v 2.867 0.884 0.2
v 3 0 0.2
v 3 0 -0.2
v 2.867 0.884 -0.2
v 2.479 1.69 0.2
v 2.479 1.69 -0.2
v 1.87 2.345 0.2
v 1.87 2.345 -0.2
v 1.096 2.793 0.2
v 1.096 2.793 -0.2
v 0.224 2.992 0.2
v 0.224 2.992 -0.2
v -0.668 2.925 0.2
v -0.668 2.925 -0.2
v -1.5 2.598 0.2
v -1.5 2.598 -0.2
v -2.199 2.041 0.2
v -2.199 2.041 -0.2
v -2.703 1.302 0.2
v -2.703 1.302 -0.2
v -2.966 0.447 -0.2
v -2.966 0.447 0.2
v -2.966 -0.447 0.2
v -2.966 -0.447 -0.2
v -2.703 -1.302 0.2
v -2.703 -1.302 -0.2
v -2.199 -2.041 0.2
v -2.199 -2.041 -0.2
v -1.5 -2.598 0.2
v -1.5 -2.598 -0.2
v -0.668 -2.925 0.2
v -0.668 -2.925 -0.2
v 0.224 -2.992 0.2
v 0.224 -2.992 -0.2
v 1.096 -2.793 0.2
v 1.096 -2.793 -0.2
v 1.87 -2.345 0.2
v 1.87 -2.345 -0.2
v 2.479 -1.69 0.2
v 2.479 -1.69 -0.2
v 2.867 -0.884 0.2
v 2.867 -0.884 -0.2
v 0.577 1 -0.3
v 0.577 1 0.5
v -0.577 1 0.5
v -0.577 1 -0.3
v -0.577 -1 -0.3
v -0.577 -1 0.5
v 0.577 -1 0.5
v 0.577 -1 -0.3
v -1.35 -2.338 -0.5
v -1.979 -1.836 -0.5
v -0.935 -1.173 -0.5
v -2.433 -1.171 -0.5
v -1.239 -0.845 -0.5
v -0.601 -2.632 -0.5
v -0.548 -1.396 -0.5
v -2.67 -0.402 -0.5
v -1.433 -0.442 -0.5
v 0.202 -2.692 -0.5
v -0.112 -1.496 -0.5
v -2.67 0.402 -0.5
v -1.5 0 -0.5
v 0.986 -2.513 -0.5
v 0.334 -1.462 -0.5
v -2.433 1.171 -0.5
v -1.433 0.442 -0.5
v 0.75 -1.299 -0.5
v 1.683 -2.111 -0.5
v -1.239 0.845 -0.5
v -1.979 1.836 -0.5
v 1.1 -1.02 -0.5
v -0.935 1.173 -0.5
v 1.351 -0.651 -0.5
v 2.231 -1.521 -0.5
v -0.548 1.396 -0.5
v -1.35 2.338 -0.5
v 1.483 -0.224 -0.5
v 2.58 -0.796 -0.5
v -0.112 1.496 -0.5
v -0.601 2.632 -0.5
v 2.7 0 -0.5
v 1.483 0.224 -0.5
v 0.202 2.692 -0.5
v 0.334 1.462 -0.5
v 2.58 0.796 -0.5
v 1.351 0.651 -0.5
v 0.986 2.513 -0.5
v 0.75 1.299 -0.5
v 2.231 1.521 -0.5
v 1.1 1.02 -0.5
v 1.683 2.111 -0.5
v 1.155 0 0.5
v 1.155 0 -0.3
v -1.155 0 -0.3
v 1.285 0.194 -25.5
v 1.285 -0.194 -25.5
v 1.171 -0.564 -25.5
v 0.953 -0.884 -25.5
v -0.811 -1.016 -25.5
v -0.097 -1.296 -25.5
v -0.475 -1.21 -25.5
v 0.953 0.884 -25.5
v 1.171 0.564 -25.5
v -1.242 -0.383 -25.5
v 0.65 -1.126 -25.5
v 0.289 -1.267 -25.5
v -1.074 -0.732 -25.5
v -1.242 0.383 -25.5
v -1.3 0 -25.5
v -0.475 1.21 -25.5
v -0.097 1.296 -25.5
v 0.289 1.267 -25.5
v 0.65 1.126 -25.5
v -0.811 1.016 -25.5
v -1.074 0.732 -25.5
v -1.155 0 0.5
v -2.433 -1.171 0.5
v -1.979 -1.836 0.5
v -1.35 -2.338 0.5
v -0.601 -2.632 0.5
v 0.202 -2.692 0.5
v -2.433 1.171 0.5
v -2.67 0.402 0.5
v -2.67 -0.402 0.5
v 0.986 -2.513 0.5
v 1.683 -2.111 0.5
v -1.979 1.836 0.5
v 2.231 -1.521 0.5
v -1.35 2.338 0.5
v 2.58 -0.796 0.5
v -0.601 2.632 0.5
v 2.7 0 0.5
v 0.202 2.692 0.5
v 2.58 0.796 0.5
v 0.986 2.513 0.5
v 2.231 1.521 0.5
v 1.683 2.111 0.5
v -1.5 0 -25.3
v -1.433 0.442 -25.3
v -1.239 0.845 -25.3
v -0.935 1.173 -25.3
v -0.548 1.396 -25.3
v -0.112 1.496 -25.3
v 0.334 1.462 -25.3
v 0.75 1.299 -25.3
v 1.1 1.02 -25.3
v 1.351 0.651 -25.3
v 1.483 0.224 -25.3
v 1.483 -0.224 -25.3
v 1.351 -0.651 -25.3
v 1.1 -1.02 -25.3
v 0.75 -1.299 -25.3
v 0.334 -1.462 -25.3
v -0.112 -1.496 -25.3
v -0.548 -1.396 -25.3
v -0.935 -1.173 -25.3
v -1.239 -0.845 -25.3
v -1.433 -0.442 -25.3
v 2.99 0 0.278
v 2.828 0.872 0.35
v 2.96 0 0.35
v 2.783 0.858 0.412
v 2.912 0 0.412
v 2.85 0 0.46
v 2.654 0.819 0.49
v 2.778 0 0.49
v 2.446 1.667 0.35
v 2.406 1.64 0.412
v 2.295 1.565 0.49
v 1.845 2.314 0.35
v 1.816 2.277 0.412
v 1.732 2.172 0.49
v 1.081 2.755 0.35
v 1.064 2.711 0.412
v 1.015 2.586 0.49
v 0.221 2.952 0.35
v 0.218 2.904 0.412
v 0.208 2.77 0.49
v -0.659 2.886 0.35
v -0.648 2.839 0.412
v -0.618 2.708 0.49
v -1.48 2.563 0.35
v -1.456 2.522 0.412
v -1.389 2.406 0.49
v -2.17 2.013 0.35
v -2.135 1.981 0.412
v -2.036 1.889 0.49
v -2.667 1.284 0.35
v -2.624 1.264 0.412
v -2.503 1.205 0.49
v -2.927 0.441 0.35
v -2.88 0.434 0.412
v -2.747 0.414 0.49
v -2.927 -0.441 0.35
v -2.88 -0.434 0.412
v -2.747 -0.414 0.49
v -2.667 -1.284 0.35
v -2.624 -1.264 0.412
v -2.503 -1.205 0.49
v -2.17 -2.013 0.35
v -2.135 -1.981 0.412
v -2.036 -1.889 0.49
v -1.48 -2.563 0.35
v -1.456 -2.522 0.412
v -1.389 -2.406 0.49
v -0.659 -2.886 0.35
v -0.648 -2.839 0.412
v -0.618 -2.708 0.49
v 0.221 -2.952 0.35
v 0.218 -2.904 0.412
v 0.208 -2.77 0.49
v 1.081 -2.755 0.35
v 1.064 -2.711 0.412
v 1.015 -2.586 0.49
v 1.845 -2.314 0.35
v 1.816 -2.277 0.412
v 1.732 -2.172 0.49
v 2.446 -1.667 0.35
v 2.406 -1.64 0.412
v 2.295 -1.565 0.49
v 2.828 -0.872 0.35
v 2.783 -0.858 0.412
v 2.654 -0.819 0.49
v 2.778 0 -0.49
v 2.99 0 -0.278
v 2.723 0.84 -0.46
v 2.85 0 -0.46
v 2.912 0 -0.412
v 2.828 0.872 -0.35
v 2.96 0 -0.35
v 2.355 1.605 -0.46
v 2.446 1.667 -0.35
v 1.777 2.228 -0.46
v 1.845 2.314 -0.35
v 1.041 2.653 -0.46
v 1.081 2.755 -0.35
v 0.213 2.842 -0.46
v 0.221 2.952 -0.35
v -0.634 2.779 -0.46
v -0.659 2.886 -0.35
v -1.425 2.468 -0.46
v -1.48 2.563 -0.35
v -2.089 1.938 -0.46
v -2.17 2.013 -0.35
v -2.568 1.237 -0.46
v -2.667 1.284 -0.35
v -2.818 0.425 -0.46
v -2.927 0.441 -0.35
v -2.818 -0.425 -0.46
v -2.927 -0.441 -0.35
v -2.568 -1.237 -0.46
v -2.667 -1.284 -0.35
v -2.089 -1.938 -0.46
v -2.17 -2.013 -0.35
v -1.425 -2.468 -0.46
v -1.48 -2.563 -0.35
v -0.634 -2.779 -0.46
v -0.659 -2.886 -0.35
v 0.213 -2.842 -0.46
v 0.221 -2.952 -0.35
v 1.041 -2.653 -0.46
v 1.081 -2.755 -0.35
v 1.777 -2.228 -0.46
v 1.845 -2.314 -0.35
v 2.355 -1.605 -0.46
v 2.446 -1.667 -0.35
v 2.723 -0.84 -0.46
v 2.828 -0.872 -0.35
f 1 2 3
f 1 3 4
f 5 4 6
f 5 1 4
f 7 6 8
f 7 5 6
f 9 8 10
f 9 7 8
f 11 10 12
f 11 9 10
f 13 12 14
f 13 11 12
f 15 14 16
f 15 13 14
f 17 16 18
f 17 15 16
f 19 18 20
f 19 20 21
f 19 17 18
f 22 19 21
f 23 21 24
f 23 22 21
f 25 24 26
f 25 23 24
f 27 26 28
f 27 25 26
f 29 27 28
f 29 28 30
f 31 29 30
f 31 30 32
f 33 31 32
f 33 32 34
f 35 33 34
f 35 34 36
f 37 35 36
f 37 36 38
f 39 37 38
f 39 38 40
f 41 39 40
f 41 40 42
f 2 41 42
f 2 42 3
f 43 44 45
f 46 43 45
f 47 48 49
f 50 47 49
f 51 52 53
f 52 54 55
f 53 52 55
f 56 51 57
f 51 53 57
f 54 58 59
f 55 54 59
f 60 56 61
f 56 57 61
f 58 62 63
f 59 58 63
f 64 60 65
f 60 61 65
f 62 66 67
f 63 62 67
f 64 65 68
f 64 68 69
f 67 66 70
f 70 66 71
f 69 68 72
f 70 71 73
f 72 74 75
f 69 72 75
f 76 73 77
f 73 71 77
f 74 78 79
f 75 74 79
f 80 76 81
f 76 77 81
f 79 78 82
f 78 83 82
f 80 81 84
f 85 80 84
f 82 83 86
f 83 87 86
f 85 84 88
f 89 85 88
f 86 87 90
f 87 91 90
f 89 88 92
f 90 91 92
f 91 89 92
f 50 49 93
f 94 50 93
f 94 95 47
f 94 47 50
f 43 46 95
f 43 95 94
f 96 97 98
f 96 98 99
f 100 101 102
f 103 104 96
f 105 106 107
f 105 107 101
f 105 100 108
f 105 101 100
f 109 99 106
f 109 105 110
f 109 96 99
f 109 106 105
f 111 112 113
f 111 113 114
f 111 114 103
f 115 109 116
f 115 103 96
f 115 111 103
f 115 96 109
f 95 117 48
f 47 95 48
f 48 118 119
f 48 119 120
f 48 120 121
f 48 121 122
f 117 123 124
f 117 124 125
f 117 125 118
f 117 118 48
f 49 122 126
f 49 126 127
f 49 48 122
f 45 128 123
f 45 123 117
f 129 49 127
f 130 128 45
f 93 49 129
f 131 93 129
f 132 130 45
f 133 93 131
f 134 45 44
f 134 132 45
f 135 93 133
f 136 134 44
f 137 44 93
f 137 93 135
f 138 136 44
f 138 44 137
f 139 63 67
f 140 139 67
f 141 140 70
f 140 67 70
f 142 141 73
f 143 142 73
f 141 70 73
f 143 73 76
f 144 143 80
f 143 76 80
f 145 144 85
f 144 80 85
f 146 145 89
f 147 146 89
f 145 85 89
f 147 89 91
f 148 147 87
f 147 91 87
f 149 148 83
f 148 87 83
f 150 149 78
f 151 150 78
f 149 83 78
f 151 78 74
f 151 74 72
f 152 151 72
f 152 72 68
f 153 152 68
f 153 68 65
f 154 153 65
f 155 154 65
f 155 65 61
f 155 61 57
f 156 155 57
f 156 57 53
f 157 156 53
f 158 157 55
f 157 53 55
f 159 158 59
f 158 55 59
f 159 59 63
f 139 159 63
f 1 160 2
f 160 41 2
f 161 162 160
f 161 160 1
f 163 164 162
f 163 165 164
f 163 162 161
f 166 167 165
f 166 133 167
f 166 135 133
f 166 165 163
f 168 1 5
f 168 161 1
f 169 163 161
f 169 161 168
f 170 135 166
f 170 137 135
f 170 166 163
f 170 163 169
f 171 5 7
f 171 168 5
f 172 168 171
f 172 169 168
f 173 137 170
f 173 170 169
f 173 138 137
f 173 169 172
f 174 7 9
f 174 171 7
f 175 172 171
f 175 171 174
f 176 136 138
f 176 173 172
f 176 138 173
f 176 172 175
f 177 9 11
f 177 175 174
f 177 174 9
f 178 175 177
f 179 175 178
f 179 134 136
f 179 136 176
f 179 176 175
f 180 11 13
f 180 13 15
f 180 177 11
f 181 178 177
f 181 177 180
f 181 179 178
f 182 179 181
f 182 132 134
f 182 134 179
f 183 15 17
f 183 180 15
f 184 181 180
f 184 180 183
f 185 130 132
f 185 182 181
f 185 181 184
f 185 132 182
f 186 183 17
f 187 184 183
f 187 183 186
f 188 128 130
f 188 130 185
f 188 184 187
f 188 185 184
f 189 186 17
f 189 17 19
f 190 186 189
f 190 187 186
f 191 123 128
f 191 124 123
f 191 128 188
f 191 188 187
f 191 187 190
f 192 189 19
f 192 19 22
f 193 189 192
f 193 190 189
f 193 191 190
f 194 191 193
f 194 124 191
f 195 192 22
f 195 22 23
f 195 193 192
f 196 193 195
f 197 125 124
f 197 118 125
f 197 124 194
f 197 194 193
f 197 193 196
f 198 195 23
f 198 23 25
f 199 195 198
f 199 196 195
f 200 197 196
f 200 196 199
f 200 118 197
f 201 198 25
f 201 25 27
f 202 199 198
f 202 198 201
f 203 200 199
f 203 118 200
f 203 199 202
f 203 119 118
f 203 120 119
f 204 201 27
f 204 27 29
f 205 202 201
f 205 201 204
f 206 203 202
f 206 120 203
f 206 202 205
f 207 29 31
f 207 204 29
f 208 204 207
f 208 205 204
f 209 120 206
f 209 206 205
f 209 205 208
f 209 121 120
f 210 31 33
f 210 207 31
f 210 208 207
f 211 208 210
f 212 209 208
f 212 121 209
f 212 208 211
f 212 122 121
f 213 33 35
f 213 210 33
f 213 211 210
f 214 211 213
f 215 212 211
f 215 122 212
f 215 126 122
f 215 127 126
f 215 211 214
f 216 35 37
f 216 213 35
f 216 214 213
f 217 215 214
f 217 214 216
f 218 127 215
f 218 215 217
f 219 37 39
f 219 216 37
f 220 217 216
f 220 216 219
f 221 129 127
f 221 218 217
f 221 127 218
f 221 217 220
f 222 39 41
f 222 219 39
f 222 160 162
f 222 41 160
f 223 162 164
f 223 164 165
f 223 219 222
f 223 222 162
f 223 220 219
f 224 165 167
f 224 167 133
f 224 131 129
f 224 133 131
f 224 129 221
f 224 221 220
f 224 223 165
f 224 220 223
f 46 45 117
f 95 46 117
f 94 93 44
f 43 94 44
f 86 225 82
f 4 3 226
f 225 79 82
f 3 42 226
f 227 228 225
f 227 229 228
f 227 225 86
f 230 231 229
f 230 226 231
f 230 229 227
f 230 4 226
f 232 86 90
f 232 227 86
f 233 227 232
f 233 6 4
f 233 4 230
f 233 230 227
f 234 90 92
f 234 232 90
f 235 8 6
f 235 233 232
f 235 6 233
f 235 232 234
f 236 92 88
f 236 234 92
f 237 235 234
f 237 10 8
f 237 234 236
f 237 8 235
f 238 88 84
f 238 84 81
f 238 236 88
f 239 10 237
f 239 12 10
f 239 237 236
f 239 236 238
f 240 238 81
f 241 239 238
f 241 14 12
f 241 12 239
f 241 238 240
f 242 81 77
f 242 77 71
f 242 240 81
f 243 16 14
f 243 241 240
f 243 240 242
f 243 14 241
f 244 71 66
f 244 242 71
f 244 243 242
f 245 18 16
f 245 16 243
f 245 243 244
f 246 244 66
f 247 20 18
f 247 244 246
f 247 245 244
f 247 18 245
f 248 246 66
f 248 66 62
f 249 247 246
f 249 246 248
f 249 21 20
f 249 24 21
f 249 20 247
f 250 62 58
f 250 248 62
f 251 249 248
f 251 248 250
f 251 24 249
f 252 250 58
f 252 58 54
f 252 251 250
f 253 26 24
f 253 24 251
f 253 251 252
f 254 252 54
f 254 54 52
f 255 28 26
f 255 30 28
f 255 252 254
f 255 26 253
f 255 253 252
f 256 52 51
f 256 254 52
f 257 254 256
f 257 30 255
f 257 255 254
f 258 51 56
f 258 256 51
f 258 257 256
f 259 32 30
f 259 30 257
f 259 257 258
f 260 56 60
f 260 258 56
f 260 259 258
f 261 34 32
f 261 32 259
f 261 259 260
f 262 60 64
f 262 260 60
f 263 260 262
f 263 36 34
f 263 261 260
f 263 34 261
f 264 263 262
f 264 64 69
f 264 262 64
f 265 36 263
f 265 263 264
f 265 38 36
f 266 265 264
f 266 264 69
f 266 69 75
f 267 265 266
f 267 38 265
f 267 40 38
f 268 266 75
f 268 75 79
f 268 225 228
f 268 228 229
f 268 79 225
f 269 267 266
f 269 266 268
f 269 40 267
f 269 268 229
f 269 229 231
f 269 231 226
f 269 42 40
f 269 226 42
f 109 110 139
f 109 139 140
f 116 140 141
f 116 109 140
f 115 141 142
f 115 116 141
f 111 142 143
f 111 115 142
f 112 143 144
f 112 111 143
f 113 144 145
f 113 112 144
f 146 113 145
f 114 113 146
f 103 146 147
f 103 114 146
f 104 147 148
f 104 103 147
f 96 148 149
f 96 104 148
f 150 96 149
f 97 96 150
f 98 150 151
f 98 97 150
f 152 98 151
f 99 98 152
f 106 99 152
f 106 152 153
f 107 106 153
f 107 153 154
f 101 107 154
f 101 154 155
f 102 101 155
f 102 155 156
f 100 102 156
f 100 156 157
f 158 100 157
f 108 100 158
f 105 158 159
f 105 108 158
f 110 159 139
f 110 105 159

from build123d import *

# Parameters (mm, degrees)
SKETCH_1_R          = 3
EXTRUDE_1_DEPTH     = 0.5
SKETCH_2_R          = 1.5
EXTRUDE_2_DEPTH     = 25
CHAMFER_1_SIZE      = 0.2
CUT_EXTRUDE_1_DEPTH = 0.8
FILLET_2_R          = 0.3


with BuildPart() as part:
    # 草图1 → 凸台-拉伸1 (new body, symmetric)
    with BuildSketch(Plane.XY):
        Circle(SKETCH_1_R)
    extrude(amount=EXTRUDE_1_DEPTH, both=True)

    # 草图2 → 凸台-拉伸2 (add)
    with BuildSketch(Plane(origin=(0, 0, -0.5), x_dir=(-1, 0, 0), z_dir=(0, 0, -1))):
        Circle(SKETCH_2_R)
    extrude(amount=EXTRUDE_2_DEPTH)

    # 倒角1
    chamfer_1_edges = [part.edges().sort_by_distance(p)[0] for p in [
        (1.5, 0, -25.5),
    ]]
    chamfer(chamfer_1_edges, length=CHAMFER_1_SIZE)

    # 草图3 → 切除-拉伸1 (cut)
    with BuildSketch(Plane.XY.offset(0.5)):
        Polygon((1.154700538, 0), (0.577350269, 1), (-0.577350269, 1), (-1.154700538, 0), (-0.577350269, -1), (0.577350269, -1), align=None)
    extrude(amount=-CUT_EXTRUDE_1_DEPTH, mode=Mode.SUBTRACT)

    # 圆角2
    fillet_2_edges = [part.edges().sort_by_distance(p)[0] for p in [
        (-3, 0, -0.5),
        (-3, 0, 0.5),
    ]]
    fillet(fillet_2_edges, radius=FILLET_2_R)


solid = part.part
